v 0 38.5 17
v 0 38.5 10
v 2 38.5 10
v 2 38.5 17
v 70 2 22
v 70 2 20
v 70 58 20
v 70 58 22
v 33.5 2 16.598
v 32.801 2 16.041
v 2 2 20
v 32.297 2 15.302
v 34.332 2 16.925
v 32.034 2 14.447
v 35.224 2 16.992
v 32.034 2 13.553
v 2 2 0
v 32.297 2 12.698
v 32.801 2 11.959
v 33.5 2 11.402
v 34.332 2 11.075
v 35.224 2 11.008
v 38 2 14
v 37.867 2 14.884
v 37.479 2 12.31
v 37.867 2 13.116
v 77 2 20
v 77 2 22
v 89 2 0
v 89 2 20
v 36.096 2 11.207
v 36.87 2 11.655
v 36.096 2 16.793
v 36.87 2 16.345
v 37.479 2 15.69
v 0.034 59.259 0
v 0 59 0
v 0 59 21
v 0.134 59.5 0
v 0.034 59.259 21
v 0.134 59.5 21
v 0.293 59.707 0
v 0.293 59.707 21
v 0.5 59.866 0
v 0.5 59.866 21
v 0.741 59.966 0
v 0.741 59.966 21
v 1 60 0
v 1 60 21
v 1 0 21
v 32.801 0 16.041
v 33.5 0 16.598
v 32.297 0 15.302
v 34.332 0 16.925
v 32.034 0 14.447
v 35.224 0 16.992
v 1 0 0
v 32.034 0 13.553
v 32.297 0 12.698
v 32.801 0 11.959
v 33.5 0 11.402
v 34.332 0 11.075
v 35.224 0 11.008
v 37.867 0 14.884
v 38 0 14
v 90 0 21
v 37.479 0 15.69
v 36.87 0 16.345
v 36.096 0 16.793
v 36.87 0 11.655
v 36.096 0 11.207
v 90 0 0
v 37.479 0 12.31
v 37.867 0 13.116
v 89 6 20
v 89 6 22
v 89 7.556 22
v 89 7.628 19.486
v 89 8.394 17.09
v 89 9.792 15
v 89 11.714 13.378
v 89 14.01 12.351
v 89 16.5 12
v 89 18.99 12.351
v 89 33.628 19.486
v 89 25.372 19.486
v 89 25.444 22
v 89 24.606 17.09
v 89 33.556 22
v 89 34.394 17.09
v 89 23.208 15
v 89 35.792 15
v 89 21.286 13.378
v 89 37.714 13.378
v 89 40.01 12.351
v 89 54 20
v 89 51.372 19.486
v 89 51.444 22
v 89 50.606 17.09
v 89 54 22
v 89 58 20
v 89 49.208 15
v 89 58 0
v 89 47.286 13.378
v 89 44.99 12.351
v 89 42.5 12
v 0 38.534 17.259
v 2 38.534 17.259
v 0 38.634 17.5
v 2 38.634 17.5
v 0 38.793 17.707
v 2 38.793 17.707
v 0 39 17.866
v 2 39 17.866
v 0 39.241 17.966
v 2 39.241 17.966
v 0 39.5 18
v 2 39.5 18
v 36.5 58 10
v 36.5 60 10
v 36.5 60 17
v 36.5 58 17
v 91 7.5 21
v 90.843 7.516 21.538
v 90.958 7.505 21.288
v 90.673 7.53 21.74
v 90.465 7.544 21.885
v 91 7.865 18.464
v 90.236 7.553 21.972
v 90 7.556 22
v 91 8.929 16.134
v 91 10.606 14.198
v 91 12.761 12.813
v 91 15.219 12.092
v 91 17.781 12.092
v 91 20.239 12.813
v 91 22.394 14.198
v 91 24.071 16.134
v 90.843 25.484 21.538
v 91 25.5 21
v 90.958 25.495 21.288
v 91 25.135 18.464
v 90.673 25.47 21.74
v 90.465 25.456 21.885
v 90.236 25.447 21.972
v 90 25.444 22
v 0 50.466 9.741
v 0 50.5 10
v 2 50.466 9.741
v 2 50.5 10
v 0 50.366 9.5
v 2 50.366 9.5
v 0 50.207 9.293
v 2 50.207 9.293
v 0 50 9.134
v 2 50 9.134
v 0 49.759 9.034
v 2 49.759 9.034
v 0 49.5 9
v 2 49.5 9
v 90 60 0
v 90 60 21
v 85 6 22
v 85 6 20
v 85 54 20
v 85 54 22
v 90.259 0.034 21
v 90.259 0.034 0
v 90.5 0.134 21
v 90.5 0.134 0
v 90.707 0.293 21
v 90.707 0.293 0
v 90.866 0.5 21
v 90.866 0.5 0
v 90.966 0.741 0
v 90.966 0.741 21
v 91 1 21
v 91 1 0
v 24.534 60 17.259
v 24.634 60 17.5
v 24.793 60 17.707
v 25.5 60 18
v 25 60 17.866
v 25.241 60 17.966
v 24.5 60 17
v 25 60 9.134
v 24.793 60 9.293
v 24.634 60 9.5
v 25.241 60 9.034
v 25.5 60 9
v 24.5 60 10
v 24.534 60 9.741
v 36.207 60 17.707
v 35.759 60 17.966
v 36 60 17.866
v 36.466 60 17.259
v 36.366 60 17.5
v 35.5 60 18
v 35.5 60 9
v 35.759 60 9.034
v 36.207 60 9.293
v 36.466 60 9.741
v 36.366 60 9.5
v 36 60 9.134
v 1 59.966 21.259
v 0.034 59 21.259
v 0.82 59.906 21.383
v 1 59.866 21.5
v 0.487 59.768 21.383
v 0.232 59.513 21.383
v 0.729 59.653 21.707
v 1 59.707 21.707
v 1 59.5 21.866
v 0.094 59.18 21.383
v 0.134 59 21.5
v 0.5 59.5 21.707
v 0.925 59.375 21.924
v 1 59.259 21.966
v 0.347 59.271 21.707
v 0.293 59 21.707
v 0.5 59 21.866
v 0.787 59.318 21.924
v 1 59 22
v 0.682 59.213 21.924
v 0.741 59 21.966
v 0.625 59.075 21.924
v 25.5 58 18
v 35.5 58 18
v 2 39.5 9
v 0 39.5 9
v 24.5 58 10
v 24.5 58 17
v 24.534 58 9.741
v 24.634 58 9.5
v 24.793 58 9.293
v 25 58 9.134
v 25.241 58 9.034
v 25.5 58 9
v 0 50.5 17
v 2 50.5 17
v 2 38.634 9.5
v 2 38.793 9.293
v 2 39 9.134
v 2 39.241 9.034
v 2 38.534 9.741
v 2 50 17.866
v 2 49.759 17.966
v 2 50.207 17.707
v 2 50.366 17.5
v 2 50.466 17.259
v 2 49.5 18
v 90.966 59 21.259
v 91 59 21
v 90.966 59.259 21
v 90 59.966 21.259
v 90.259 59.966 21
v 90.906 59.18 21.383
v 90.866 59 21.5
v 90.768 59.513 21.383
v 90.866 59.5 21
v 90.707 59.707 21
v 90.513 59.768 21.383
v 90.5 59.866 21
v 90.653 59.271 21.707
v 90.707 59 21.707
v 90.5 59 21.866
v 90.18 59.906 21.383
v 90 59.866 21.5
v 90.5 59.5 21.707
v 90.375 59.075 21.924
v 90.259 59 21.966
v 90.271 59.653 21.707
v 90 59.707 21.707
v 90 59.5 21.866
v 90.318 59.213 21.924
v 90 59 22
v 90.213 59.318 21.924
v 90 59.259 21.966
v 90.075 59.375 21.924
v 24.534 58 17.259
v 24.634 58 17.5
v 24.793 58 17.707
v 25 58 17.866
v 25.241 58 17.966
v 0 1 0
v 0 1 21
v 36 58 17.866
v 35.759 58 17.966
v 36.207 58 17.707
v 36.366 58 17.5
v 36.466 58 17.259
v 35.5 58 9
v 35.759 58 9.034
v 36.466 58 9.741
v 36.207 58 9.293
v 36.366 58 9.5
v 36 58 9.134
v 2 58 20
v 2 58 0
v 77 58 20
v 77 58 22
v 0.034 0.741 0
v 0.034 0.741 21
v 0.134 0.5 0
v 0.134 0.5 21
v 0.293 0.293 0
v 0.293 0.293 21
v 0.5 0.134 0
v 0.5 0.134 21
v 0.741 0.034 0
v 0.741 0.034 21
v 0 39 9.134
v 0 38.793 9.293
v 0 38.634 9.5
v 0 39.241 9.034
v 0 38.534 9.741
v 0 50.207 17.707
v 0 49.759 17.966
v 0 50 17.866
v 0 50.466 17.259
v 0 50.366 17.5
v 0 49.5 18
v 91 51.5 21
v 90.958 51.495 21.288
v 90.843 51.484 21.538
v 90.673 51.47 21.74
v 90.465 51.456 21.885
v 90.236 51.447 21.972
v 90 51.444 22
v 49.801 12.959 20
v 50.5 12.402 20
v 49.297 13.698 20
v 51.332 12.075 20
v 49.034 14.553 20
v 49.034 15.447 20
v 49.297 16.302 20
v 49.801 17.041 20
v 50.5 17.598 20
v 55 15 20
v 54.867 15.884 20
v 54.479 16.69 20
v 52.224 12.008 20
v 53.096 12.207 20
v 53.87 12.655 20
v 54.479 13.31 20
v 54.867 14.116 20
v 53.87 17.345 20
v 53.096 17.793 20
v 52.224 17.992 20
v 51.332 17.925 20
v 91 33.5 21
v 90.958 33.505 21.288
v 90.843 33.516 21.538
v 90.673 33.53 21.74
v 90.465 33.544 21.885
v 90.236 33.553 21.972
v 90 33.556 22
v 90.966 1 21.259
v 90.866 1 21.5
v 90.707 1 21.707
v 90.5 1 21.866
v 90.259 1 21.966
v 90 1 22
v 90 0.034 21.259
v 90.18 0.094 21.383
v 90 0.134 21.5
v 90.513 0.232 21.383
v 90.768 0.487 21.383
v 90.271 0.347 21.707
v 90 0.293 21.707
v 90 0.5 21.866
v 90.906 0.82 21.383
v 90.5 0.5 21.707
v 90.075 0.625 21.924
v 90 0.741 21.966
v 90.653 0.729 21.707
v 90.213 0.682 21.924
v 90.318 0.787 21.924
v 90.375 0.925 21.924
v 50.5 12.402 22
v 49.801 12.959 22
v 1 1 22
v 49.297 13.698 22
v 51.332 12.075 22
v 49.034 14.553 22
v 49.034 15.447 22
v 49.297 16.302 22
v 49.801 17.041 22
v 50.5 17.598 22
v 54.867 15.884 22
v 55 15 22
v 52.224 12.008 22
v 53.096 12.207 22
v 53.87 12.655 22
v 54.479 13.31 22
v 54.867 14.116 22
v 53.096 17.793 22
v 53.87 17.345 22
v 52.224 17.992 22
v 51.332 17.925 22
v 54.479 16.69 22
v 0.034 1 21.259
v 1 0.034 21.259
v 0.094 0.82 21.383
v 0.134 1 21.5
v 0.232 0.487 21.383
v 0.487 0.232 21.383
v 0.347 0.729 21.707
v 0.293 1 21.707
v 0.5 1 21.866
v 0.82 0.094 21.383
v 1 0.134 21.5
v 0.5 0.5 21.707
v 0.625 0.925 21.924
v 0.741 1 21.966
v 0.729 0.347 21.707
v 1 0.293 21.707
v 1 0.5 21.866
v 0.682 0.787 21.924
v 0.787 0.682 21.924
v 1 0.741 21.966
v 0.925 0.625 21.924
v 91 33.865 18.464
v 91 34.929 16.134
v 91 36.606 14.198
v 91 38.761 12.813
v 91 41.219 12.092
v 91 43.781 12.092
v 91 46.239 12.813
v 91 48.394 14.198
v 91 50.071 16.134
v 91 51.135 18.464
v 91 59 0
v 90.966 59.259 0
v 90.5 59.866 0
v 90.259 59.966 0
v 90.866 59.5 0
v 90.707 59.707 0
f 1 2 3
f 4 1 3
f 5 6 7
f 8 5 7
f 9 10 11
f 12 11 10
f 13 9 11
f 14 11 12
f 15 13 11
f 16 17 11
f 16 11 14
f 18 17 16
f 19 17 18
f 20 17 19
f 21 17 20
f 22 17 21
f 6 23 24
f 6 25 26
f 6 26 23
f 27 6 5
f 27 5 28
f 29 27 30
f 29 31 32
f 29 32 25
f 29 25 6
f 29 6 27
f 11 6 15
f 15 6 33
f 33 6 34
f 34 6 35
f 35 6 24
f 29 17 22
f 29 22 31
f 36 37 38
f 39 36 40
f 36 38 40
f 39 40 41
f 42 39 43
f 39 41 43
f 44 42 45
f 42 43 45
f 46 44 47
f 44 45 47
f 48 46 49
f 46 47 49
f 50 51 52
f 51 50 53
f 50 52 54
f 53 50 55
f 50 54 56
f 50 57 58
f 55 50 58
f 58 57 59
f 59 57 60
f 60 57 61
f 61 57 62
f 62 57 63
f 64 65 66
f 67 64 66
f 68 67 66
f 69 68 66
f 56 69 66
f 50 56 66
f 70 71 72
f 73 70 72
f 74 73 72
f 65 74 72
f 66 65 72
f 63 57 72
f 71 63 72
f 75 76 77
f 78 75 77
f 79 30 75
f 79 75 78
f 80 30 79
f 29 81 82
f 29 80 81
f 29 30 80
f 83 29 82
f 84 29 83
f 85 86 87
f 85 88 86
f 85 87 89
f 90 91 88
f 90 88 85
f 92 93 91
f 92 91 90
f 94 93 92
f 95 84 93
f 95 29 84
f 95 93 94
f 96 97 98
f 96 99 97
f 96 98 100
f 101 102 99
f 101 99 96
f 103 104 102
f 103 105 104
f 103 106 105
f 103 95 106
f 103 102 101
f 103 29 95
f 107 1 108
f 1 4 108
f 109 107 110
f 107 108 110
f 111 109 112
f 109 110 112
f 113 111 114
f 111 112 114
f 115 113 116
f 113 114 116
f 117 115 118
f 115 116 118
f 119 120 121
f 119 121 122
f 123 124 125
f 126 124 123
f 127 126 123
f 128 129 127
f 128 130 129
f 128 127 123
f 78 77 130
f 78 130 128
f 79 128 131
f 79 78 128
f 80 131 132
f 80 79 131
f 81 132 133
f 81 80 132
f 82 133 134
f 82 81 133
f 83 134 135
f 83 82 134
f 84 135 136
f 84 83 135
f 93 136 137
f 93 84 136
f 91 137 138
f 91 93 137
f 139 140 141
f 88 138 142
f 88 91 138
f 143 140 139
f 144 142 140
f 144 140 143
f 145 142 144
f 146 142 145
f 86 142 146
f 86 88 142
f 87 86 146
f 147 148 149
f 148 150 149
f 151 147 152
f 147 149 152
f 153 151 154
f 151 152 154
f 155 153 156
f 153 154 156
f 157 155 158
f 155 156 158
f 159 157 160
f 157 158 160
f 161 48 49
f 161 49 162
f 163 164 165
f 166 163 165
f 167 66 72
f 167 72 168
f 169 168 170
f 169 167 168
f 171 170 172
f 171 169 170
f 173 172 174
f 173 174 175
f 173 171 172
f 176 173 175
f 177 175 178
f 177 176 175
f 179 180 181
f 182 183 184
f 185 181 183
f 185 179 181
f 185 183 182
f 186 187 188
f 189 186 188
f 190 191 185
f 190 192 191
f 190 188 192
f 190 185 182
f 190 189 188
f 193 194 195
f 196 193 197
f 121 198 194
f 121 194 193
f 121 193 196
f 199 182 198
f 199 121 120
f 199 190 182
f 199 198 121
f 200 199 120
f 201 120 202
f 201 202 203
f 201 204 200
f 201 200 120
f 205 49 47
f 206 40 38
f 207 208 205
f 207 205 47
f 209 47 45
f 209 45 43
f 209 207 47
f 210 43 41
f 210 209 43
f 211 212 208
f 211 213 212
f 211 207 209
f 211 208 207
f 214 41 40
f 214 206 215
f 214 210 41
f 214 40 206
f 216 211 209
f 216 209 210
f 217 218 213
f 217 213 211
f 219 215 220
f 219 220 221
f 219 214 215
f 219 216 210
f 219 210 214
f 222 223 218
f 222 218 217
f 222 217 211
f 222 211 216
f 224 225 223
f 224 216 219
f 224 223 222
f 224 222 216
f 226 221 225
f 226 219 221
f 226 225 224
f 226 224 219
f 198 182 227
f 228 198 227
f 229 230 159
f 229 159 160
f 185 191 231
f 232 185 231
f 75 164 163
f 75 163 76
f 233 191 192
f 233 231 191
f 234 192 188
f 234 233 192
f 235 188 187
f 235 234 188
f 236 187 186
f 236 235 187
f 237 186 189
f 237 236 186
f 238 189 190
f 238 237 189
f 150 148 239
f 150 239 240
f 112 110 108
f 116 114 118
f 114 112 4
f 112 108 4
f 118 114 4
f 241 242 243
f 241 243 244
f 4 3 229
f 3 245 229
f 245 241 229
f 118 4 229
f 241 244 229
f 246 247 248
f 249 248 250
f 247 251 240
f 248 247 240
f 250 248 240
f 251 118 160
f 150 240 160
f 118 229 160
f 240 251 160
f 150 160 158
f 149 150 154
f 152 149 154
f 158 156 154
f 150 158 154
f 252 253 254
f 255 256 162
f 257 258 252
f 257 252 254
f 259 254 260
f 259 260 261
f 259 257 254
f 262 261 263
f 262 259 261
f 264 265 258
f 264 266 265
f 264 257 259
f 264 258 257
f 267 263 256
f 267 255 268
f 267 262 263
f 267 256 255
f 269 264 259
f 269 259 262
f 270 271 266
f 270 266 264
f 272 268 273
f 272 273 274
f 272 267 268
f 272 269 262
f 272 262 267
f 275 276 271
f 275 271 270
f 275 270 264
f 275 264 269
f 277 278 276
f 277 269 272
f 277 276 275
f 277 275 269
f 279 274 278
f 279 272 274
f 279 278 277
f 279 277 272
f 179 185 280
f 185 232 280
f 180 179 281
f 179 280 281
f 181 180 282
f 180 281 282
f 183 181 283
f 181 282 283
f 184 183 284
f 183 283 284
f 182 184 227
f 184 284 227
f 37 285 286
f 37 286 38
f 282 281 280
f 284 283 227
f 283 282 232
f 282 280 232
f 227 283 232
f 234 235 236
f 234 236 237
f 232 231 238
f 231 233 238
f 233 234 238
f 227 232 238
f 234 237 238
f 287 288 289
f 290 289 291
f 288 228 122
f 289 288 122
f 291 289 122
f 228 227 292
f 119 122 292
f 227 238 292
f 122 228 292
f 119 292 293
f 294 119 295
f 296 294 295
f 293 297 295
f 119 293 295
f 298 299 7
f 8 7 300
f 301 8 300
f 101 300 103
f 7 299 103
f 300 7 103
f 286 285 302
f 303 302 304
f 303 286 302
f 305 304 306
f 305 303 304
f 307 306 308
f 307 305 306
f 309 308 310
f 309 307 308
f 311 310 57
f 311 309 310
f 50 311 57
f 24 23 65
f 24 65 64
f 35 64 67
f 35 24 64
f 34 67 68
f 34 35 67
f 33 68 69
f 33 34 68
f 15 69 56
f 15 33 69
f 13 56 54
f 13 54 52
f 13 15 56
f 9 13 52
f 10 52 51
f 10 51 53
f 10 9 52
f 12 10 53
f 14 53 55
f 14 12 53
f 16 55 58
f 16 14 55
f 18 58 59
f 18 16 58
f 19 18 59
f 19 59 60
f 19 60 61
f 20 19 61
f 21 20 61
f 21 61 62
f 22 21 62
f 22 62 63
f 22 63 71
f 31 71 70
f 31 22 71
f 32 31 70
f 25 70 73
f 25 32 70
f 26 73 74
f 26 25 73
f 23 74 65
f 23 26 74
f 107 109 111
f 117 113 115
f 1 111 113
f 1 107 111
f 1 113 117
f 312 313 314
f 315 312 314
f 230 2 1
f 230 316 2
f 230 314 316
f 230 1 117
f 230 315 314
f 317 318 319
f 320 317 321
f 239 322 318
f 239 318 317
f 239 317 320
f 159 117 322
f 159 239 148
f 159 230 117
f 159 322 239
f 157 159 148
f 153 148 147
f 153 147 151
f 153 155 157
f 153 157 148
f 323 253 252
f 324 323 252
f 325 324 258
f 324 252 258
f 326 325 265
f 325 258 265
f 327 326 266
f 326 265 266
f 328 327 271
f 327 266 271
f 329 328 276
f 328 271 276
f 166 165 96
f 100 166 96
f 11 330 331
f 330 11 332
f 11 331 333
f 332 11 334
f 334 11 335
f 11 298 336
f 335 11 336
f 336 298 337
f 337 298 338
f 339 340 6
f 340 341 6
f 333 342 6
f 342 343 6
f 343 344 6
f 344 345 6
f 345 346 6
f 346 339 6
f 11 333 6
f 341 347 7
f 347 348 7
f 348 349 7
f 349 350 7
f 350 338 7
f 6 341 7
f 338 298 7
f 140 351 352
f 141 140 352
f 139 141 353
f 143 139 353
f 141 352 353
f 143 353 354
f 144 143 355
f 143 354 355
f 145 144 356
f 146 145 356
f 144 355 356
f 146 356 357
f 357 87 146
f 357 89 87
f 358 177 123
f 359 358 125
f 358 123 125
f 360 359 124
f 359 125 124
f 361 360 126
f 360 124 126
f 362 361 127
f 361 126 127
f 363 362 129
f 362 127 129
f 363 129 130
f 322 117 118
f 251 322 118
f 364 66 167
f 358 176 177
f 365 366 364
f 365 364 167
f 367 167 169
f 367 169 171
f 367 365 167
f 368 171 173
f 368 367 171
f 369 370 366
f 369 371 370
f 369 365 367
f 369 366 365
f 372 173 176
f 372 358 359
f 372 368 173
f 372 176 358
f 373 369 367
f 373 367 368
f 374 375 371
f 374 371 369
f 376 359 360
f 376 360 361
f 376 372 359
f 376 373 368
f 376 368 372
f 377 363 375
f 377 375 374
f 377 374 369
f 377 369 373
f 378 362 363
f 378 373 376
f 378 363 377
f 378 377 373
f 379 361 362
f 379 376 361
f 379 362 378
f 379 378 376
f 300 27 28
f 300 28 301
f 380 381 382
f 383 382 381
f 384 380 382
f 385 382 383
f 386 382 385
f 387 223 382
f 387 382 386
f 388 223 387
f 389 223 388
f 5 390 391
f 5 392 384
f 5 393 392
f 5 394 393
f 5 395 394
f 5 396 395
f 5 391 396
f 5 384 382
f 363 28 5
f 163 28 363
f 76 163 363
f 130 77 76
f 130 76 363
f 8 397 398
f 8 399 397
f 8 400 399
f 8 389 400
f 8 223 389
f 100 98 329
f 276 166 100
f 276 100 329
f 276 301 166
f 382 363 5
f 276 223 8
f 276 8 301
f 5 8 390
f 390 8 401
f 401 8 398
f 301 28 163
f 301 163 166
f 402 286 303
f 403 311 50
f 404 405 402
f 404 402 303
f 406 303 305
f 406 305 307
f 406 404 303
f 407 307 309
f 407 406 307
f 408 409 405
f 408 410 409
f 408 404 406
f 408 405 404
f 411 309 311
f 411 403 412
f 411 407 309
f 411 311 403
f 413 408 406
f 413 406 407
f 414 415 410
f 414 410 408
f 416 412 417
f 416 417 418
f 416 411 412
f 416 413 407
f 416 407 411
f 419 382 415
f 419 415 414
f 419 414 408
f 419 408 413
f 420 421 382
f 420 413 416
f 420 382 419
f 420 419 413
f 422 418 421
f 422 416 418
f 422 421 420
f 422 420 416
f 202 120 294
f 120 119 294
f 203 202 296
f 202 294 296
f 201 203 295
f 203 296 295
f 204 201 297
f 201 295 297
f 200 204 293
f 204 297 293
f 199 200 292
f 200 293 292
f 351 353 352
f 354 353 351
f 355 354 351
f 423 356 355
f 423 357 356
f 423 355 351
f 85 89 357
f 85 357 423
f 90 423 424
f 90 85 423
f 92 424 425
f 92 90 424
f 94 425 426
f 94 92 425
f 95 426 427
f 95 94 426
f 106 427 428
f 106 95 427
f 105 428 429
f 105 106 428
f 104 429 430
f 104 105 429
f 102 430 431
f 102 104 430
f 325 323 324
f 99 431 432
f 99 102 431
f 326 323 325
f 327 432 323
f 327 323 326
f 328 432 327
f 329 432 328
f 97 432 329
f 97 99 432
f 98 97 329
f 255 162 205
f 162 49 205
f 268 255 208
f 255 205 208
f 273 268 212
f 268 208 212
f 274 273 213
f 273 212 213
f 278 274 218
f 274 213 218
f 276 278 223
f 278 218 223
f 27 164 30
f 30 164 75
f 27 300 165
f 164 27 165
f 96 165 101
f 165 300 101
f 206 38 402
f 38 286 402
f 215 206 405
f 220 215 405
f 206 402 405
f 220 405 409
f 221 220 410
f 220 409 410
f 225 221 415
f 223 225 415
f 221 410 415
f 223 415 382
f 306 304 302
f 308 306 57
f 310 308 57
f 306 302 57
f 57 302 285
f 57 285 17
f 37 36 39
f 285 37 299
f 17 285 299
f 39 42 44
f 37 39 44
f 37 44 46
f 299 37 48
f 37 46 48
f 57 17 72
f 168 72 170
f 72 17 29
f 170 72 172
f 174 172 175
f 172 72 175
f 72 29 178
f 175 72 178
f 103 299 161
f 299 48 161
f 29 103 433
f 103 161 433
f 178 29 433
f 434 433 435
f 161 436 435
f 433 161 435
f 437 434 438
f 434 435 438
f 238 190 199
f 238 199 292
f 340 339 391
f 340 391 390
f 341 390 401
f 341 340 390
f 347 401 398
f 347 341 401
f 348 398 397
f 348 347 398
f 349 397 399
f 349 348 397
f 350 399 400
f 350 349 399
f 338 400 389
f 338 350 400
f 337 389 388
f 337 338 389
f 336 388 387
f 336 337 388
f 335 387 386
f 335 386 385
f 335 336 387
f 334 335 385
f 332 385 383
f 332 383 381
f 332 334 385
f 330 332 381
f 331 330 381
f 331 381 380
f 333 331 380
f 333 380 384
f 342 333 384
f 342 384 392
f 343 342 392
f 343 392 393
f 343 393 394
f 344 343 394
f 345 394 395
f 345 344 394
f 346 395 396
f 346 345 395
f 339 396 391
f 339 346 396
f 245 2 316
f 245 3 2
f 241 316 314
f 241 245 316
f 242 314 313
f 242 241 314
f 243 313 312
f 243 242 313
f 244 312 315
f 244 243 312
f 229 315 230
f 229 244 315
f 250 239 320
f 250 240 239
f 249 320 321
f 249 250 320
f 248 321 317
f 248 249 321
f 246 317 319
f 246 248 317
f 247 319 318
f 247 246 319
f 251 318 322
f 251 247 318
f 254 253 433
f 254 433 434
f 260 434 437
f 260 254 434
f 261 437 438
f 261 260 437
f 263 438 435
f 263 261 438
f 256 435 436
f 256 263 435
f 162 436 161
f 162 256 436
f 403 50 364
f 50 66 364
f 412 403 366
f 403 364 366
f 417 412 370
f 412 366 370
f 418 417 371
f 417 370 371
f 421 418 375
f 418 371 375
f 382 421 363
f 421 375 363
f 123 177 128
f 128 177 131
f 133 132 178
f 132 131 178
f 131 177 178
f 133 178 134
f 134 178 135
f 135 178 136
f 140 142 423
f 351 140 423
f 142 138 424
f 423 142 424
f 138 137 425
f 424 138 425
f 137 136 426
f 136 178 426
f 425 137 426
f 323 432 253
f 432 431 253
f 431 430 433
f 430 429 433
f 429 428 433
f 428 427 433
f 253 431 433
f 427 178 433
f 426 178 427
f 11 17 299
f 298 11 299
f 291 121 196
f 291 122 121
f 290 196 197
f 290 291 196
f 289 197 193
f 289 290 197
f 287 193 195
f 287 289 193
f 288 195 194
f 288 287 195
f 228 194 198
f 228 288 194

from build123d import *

# Parameters (mm, degrees)
CYLINDER_R                = 3
CYLINDER_DEPTH            = 2
CYLINDER_ROLL_ANGLE       = 90
CYLINDER002_R             = 9
CYLINDER002_DEPTH         = 2
CYLINDER002_PITCH_ANGLE   = 90
CYLINDER003_R             = 9
CYLINDER003_DEPTH         = 2
CYLINDER003_PITCH_ANGLE   = 90
BOX003_W                  = 4
BOX003_H                  = 48
BOX003_DEPTH              = 2
BOX002_W                  = 7
BOX002_H                  = 56
BOX002_DEPTH              = 2
CYLINDER001_R             = 3
CYLINDER001_DEPTH         = 2
BOX001_W                  = 87
BOX001_H                  = 56
BOX001_DEPTH              = 20
BOX_W                     = 91
BOX_H                     = 60
BOX_DEPTH                 = 22
FILLET_R                  = 1
FILLET001_R               = 1
FILLET002_R               = 1
FILLET003_R               = 1
FILLET004_R               = 1
BOX004_W                  = 2
BOX004_H                  = 12
BOX004_DEPTH              = 9
FILLET005_R               = 1
BOX005_W                  = 2
BOX005_H                  = 12
BOX005_DEPTH              = 9
FILLET006_R               = 1
FILLET006_PLACEMENT_ANGLE = -90


with BuildPart() as cilindro:
    # Cylinder → Cylinder (new body)
    with BuildSketch(Plane.XY):
        Circle(CYLINDER_R)
    extrude(amount=CYLINDER_DEPTH)


with BuildPart() as cilindro_1:
    # Cylinder roll: moved
    add(cilindro.part.rotate(Axis((0, 0, 0), (1, 0, 0)), CYLINDER_ROLL_ANGLE))


with BuildPart() as cilindro_2:
    # Cylinder placement: moved
    add(cilindro_1.part.moved(Location((35, 2, 14))))


with BuildPart() as cilindro002:
    # Cylinder002 → Cylinder002 (new body)
    with BuildSketch(Plane.XY):
        Circle(CYLINDER002_R)
    extrude(amount=CYLINDER002_DEPTH)


with BuildPart() as cilindro002_1:
    # Cylinder002 pitch: moved
    add(cilindro002.part.rotate(Axis((0, 0, 0), (0, 1, 0)), CYLINDER002_PITCH_ANGLE))


with BuildPart() as cilindro002_2:
    # Cylinder002 placement: moved
    add(cilindro002_1.part.moved(Location((89, 16.5, 21))))


with BuildPart() as cilindro003:
    # Cylinder003 → Cylinder003 (new body)
    with BuildSketch(Plane.XY):
        Circle(CYLINDER003_R)
    extrude(amount=CYLINDER003_DEPTH)


with BuildPart() as cilindro003_1:
    # Cylinder003 pitch: moved
    add(cilindro003.part.rotate(Axis((0, 0, 0), (0, 1, 0)), CYLINDER003_PITCH_ANGLE))


with BuildPart() as cilindro003_2:
    # Cylinder003 placement: moved
    add(cilindro003_1.part.moved(Location((89, 42.5, 21))))


with BuildPart() as cubo001:
    # Box003 → Box003 (new body)
    with BuildSketch(Plane(origin=(85, 6, 20), x_dir=(1, 0, 0), z_dir=(0, 0, 1))):
        with Locations((2, 24)):
            Rectangle(BOX003_W, BOX003_H)
    extrude(amount=BOX003_DEPTH)


with BuildPart() as cubo:
    # Box002 → Box002 (new body)
    with BuildSketch(Plane(origin=(70, 2, 20), x_dir=(1, 0, 0), z_dir=(0, 0, 1))):
        with Locations((3.5, 28)):
            Rectangle(BOX002_W, BOX002_H)
    extrude(amount=BOX002_DEPTH)


with BuildPart() as fusion:
    # Cylinder001 → Cylinder001 (new body)
    with BuildSketch(Plane(origin=(52, 15, 20), x_dir=(1, 0, 0), z_dir=(0, 0, 1))):
        Circle(CYLINDER001_R)
    extrude(amount=CYLINDER001_DEPTH)

    # Fusion: union Cilindro, Cilindro002, Cilindro003, Cubo001, Cubo
    add(cilindro_2.part)
    add(cilindro002_2.part)
    add(cilindro003_2.part)
    add(cubo001.part)
    add(cubo.part)


with BuildPart() as interior:
    # Box001 → Box001 (new body)
    with BuildSketch(Plane(origin=(2, 2, 0), x_dir=(1, 0, 0), z_dir=(0, 0, 1))):
        with Locations((43.5, 28)):
            Rectangle(BOX001_W, BOX001_H)
    extrude(amount=BOX001_DEPTH)


with BuildPart() as cut001:
    # Box → Box (new body)
    with BuildSketch(Plane.XY):
        with Locations((45.5, 30)):
            Rectangle(BOX_W, BOX_H)
    extrude(amount=BOX_DEPTH)

    # Cut: cut Interior
    add(interior.part, mode=Mode.SUBTRACT)

    # Fillet
    fillet_edges = [cut001.edges().sort_by_distance(p)[0] for p in [
        (0, 0, 11),
    ]]
    fillet(fillet_edges, radius=FILLET_R)

    # Fillet001
    fillet001_edges = [cut001.edges().sort_by_distance(p)[0] for p in [
        (0, 60, 11),
    ]]
    fillet(fillet001_edges, radius=FILLET001_R)

    # Fillet002
    fillet002_edges = [cut001.edges().sort_by_distance(p)[0] for p in [
        (91, 0, 11),
    ]]
    fillet(fillet002_edges, radius=FILLET002_R)

    # Fillet003
    fillet003_edges = [cut001.edges().sort_by_distance(p)[0] for p in [
        (91, 60, 11),
    ]]
    fillet(fillet003_edges, radius=FILLET003_R)

    # Fillet004
    fillet004_edges = [cut001.edges().sort_by_distance(p)[0] for p in [
        (45.5, 0, 22),
    ]]
    fillet(fillet004_edges, radius=FILLET004_R)

    # Cut001: cut Fusion
    add(fusion.part, mode=Mode.SUBTRACT)


with BuildPart() as fillet005:
    # Box004 → Box004 (new body)
    with BuildSketch(Plane(origin=(0, 38.5, 9), x_dir=(1, 0, 0), z_dir=(0, 0, 1))):
        with Locations((1, 6)):
            Rectangle(BOX004_W, BOX004_H)
    extrude(amount=BOX004_DEPTH)

    # Fillet005
    fillet005_edges = [fillet005.edges().sort_by_distance(p)[0] for p in [
        (1, 38.5, 9),
        (1, 38.5, 18),
        (1, 50.5, 9),
        (1, 50.5, 18),
    ]]
    fillet(fillet005_edges, radius=FILLET005_R)


with BuildPart() as fillet006:
    # Box005 → Box005 (new body)
    with BuildSketch(Plane(origin=(0, 38.5, 9), x_dir=(1, 0, 0), z_dir=(0, 0, 1))):
        with Locations((1, 6)):
            Rectangle(BOX005_W, BOX005_H)
    extrude(amount=BOX005_DEPTH)

    # Fillet006
    fillet006_edges = [fillet006.edges().sort_by_distance(p)[0] for p in [
        (1, 38.5, 9),
        (1, 38.5, 18),
        (1, 50.5, 9),
        (1, 50.5, 18),
    ]]
    fillet(fillet006_edges, radius=FILLET006_R)


with BuildPart() as fillet006_1:
    # Fillet006 placement: moved
    add(fillet006.part.moved(Location((-14, 60, 0))).rotate(Axis((-14, 60, 0), (0, 0, 1)), FILLET006_PLACEMENT_ANGLE))


solid = Compound([cut001.part, fillet005.part, fillet006_1.part])
